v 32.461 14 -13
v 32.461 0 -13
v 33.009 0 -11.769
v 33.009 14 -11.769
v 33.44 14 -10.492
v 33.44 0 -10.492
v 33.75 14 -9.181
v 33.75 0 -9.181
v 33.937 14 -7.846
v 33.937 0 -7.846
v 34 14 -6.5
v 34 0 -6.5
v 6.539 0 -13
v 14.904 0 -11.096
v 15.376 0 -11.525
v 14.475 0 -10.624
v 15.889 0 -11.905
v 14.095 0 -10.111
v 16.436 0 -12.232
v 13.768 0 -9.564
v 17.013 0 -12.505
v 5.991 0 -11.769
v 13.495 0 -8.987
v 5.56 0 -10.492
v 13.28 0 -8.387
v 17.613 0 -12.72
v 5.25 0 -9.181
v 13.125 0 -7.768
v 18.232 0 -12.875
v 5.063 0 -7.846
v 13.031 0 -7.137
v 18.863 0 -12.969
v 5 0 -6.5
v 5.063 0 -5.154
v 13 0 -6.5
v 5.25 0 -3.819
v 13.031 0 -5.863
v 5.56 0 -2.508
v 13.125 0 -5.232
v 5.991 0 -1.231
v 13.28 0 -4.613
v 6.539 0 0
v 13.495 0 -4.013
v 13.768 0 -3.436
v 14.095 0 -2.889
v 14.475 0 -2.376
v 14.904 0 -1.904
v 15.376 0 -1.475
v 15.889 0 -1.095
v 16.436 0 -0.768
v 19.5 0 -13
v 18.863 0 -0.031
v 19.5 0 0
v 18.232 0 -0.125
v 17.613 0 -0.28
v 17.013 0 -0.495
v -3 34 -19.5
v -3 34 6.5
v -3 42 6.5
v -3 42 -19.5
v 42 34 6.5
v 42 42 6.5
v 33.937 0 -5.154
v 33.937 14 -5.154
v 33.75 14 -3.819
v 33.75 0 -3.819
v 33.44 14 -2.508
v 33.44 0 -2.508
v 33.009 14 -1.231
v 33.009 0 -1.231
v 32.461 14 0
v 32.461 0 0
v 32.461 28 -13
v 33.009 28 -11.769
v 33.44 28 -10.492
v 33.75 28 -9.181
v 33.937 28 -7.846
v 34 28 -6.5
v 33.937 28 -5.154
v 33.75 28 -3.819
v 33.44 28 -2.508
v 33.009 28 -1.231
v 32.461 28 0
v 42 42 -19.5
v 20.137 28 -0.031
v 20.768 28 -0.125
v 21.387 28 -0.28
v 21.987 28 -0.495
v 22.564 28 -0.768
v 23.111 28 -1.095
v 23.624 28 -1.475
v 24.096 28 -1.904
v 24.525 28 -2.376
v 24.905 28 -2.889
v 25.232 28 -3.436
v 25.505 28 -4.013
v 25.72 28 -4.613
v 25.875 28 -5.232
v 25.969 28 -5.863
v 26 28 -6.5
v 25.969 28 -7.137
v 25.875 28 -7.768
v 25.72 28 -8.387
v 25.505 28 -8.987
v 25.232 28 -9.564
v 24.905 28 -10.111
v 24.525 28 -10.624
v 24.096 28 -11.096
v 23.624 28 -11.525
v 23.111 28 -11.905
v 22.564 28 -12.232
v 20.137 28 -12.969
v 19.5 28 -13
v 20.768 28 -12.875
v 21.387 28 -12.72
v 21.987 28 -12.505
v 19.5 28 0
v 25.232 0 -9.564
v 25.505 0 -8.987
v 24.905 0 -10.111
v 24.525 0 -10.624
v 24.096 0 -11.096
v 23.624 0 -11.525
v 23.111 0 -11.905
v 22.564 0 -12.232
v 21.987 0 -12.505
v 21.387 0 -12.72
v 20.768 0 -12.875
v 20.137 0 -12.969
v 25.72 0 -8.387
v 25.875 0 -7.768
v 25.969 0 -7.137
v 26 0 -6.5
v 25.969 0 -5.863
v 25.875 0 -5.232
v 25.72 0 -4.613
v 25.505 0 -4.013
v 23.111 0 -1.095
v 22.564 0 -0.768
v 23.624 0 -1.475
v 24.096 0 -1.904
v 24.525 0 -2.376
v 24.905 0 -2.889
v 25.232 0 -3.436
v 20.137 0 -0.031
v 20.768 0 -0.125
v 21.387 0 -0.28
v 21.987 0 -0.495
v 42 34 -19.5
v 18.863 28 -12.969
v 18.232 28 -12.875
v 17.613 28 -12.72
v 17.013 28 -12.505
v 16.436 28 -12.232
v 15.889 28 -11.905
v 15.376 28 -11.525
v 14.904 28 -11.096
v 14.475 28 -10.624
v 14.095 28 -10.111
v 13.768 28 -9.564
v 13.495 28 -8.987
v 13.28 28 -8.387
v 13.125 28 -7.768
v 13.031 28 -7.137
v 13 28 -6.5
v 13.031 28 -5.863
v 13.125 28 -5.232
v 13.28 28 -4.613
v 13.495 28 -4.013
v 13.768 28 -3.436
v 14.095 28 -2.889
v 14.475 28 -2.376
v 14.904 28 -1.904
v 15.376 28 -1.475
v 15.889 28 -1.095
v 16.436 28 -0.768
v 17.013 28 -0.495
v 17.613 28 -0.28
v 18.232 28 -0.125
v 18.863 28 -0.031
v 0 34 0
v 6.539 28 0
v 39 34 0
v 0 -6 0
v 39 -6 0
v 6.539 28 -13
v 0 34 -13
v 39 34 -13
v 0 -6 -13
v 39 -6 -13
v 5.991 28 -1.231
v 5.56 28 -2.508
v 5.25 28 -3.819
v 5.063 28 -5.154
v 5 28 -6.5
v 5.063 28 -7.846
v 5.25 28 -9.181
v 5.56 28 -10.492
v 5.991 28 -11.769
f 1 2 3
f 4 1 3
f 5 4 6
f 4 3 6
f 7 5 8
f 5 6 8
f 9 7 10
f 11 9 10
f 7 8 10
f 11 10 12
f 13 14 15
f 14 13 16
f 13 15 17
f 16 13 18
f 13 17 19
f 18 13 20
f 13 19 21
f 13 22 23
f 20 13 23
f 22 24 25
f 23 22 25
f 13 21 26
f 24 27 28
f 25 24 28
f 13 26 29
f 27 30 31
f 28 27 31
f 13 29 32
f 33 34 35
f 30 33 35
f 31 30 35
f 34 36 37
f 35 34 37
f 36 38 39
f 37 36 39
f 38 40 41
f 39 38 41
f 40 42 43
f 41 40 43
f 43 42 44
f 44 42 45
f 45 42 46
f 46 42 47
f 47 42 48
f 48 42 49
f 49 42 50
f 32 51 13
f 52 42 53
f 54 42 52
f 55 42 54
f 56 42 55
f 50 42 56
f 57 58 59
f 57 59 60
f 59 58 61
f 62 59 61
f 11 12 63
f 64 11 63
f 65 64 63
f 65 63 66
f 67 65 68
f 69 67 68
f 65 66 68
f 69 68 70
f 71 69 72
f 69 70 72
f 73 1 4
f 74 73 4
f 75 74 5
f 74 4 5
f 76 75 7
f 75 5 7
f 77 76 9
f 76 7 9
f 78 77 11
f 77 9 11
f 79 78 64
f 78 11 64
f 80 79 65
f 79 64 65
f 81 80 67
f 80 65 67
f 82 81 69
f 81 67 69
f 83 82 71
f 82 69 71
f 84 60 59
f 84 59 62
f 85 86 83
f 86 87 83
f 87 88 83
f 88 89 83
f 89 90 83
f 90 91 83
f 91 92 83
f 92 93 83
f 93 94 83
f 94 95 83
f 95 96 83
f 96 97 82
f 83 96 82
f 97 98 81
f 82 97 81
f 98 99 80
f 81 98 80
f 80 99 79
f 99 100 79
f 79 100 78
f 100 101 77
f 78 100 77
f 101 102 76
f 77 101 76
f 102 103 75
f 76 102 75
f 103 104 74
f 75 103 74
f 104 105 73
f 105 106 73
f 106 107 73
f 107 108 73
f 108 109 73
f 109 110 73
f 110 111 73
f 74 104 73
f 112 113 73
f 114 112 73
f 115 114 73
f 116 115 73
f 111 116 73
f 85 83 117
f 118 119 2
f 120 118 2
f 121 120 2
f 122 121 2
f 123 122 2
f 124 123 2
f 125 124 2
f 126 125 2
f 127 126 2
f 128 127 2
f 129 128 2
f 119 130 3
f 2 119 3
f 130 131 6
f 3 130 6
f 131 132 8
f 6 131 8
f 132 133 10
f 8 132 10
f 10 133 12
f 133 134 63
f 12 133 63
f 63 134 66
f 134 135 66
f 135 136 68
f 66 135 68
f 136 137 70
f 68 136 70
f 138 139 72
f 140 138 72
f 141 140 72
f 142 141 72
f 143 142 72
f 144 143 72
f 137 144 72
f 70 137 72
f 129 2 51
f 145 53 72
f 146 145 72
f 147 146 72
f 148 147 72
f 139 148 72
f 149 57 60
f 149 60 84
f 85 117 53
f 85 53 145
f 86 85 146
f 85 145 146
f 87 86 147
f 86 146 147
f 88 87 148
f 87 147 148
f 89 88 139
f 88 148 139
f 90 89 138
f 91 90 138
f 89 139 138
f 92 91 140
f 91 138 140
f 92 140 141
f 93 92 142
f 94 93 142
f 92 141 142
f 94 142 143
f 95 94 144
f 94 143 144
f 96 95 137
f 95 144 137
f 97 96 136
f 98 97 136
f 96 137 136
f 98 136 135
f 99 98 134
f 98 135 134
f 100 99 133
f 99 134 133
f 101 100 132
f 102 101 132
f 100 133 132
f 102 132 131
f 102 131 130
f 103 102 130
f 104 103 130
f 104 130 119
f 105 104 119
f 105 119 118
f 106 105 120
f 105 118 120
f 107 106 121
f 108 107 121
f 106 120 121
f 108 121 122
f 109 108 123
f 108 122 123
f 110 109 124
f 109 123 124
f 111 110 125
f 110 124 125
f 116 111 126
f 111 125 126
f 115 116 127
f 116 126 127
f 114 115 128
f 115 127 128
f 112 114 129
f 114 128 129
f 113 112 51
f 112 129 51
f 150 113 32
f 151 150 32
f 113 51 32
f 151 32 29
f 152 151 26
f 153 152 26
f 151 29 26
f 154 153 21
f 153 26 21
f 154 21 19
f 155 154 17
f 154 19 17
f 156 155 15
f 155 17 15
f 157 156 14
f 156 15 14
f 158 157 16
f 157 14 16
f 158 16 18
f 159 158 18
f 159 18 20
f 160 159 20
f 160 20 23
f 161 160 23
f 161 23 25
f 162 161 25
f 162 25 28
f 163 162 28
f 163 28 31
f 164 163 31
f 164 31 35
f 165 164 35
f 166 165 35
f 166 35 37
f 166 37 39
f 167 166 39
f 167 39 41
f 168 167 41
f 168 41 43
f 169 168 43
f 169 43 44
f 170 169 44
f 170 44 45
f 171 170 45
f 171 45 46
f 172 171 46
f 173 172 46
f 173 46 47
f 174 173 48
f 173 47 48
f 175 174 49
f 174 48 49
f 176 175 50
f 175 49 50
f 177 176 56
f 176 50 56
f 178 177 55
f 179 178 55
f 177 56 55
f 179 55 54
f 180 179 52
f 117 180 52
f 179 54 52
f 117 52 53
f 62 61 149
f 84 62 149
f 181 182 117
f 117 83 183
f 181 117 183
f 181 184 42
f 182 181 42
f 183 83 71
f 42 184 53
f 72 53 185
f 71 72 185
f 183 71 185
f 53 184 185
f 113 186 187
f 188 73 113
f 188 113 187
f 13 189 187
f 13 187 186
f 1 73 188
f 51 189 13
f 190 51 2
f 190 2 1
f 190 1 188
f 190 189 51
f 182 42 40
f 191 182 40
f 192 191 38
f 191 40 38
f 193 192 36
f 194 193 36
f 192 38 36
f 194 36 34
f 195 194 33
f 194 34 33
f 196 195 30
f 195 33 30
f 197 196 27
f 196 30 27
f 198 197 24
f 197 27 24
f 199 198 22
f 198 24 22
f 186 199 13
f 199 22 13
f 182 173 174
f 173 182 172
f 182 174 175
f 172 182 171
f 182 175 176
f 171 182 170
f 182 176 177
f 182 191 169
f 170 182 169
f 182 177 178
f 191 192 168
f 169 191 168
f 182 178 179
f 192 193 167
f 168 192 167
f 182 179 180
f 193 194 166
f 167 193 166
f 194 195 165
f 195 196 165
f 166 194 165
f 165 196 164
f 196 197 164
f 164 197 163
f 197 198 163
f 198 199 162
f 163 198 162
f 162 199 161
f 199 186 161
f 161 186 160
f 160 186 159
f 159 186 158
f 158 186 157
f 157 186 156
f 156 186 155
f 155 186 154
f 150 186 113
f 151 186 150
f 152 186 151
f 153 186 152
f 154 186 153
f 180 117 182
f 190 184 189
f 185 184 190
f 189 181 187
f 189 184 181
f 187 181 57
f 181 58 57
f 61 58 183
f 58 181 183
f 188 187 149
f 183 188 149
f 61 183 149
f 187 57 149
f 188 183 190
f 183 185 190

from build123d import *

# Parameters (mm, degrees)
EXTRUDE_1_DEPTH   = 14
SKETCH_1_R        = 6.5
EXTRUDE_1_2_DEPTH = 14
EXTRUDE_1_3_DEPTH = 14
SKETCH_2_W        = 39
SKETCH_2_H        = 13
EXTRUDE_2_DEPTH   = 6
SKETCH_3_R        = 6.5
EXTRUDE_3_DEPTH   = 14
SKETCH_4_W        = 39
SKETCH_4_H        = 13
EXTRUDE_4_DEPTH   = 6
SKETCH_5_W        = 45
SKETCH_5_H        = 26
EXTRUDE_5_DEPTH   = 8


with BuildPart() as part:
    # Эскиз1 → Бобышка-Вытянуть1 (new body)
    with BuildSketch(Plane(origin=(0, 0, 0), x_dir=(1, 0, 0), z_dir=(0, 1, 0))):
        with BuildLine():
            Line((0, 13), (0, 0))
            Line((0, 0), (6.538518603, 0))
            ThreePointArc((6.538518603, 0), (5, 6.5), (6.538518603, 13))
            Line((6.538518603, 13), (0, 13))
        make_face()
    extrude(amount=EXTRUDE_1_DEPTH)



with BuildPart() as body_2:
    # Эскиз1 → Extrude 1 2 (new body)
    with BuildSketch(Plane(origin=(0, 0, 0), x_dir=(1, 0, 0), z_dir=(0, 1, 0))):
        with Locations(Location((19.5, 6.5, 0), (0, 0, 270))):
            Circle(SKETCH_1_R)
    extrude(amount=EXTRUDE_1_2_DEPTH)


with BuildPart() as body_3:
    # Эскиз1 → Extrude 1 3 (new body)
    with BuildSketch(Plane(origin=(0, 0, 0), x_dir=(1, 0, 0), z_dir=(0, 1, 0))):
        with BuildLine():
            ThreePointArc((34, 6.5), (33.61012899, 3.160200624), (32.461481397, 0))
            Line((32.461481397, 0), (39, 0))
            Line((39, 0), (39, 13))
            Line((39, 13), (32.461481397, 13))
            ThreePointArc((32.461481397, 13), (33.61012899, 9.839799376), (34, 6.5))
        make_face()
    extrude(amount=EXTRUDE_1_3_DEPTH)


with BuildPart() as part_1:
    add(part.part)

    add(body_2.part)  # Бобышка-Вытянуть2 merges body 2

    add(body_3.part)  # Бобышка-Вытянуть2 merges body 3
    # Эскиз2 → Бобышка-Вытянуть2 (add)
    with BuildSketch(Plane.XZ):
        with Locations((19.5, -6.5)):
            Rectangle(SKETCH_2_W, SKETCH_2_H)
    extrude(amount=EXTRUDE_2_DEPTH)

    # Эскиз3 → Бобышка-Вытянуть3 (add)
    with BuildSketch(Plane(origin=(0, 14, 0), x_dir=(1, 0, 0), z_dir=(0, 1, 0))):
        with Locations(Location((19.5, 6.5, 0), (0, 0, 270))):
            Circle(SKETCH_3_R)
        with BuildLine():
            Line((32.461481397, 0), (39, 0))
            Line((39, 0), (39, 13))
            Line((39, 13), (32.461481397, 13))
            ThreePointArc((32.461481397, 13), (34, 6.5), (32.461481397, 0))
        make_face()
        with BuildLine():
            Line((6.538518603, 13), (0, 13))
            Line((0, 13), (0, 0))
            Line((0, 0), (6.538518603, 0))
            ThreePointArc((6.538518603, 0), (5, 6.5), (6.538518603, 13))
        make_face()
    extrude(amount=EXTRUDE_3_DEPTH)

    # Эскиз4 → Бобышка-Вытянуть4 (add)
    with BuildSketch(Plane(origin=(0, 28, 0), x_dir=(1, 0, 0), z_dir=(0, 1, 0))):
        with Locations((19.5, 6.5)):
            Rectangle(SKETCH_4_W, SKETCH_4_H)
    extrude(amount=EXTRUDE_4_DEPTH)

    # Эскиз5 → Бобышка-Вытянуть5 (add)
    with BuildSketch(Plane(origin=(0, 34, 0), x_dir=(1, 0, 0), z_dir=(0, 1, 0))):
        with Locations((19.5, 6.5)):
            Rectangle(SKETCH_5_W, SKETCH_5_H)
    extrude(amount=EXTRUDE_5_DEPTH)


solid = part_1.part
